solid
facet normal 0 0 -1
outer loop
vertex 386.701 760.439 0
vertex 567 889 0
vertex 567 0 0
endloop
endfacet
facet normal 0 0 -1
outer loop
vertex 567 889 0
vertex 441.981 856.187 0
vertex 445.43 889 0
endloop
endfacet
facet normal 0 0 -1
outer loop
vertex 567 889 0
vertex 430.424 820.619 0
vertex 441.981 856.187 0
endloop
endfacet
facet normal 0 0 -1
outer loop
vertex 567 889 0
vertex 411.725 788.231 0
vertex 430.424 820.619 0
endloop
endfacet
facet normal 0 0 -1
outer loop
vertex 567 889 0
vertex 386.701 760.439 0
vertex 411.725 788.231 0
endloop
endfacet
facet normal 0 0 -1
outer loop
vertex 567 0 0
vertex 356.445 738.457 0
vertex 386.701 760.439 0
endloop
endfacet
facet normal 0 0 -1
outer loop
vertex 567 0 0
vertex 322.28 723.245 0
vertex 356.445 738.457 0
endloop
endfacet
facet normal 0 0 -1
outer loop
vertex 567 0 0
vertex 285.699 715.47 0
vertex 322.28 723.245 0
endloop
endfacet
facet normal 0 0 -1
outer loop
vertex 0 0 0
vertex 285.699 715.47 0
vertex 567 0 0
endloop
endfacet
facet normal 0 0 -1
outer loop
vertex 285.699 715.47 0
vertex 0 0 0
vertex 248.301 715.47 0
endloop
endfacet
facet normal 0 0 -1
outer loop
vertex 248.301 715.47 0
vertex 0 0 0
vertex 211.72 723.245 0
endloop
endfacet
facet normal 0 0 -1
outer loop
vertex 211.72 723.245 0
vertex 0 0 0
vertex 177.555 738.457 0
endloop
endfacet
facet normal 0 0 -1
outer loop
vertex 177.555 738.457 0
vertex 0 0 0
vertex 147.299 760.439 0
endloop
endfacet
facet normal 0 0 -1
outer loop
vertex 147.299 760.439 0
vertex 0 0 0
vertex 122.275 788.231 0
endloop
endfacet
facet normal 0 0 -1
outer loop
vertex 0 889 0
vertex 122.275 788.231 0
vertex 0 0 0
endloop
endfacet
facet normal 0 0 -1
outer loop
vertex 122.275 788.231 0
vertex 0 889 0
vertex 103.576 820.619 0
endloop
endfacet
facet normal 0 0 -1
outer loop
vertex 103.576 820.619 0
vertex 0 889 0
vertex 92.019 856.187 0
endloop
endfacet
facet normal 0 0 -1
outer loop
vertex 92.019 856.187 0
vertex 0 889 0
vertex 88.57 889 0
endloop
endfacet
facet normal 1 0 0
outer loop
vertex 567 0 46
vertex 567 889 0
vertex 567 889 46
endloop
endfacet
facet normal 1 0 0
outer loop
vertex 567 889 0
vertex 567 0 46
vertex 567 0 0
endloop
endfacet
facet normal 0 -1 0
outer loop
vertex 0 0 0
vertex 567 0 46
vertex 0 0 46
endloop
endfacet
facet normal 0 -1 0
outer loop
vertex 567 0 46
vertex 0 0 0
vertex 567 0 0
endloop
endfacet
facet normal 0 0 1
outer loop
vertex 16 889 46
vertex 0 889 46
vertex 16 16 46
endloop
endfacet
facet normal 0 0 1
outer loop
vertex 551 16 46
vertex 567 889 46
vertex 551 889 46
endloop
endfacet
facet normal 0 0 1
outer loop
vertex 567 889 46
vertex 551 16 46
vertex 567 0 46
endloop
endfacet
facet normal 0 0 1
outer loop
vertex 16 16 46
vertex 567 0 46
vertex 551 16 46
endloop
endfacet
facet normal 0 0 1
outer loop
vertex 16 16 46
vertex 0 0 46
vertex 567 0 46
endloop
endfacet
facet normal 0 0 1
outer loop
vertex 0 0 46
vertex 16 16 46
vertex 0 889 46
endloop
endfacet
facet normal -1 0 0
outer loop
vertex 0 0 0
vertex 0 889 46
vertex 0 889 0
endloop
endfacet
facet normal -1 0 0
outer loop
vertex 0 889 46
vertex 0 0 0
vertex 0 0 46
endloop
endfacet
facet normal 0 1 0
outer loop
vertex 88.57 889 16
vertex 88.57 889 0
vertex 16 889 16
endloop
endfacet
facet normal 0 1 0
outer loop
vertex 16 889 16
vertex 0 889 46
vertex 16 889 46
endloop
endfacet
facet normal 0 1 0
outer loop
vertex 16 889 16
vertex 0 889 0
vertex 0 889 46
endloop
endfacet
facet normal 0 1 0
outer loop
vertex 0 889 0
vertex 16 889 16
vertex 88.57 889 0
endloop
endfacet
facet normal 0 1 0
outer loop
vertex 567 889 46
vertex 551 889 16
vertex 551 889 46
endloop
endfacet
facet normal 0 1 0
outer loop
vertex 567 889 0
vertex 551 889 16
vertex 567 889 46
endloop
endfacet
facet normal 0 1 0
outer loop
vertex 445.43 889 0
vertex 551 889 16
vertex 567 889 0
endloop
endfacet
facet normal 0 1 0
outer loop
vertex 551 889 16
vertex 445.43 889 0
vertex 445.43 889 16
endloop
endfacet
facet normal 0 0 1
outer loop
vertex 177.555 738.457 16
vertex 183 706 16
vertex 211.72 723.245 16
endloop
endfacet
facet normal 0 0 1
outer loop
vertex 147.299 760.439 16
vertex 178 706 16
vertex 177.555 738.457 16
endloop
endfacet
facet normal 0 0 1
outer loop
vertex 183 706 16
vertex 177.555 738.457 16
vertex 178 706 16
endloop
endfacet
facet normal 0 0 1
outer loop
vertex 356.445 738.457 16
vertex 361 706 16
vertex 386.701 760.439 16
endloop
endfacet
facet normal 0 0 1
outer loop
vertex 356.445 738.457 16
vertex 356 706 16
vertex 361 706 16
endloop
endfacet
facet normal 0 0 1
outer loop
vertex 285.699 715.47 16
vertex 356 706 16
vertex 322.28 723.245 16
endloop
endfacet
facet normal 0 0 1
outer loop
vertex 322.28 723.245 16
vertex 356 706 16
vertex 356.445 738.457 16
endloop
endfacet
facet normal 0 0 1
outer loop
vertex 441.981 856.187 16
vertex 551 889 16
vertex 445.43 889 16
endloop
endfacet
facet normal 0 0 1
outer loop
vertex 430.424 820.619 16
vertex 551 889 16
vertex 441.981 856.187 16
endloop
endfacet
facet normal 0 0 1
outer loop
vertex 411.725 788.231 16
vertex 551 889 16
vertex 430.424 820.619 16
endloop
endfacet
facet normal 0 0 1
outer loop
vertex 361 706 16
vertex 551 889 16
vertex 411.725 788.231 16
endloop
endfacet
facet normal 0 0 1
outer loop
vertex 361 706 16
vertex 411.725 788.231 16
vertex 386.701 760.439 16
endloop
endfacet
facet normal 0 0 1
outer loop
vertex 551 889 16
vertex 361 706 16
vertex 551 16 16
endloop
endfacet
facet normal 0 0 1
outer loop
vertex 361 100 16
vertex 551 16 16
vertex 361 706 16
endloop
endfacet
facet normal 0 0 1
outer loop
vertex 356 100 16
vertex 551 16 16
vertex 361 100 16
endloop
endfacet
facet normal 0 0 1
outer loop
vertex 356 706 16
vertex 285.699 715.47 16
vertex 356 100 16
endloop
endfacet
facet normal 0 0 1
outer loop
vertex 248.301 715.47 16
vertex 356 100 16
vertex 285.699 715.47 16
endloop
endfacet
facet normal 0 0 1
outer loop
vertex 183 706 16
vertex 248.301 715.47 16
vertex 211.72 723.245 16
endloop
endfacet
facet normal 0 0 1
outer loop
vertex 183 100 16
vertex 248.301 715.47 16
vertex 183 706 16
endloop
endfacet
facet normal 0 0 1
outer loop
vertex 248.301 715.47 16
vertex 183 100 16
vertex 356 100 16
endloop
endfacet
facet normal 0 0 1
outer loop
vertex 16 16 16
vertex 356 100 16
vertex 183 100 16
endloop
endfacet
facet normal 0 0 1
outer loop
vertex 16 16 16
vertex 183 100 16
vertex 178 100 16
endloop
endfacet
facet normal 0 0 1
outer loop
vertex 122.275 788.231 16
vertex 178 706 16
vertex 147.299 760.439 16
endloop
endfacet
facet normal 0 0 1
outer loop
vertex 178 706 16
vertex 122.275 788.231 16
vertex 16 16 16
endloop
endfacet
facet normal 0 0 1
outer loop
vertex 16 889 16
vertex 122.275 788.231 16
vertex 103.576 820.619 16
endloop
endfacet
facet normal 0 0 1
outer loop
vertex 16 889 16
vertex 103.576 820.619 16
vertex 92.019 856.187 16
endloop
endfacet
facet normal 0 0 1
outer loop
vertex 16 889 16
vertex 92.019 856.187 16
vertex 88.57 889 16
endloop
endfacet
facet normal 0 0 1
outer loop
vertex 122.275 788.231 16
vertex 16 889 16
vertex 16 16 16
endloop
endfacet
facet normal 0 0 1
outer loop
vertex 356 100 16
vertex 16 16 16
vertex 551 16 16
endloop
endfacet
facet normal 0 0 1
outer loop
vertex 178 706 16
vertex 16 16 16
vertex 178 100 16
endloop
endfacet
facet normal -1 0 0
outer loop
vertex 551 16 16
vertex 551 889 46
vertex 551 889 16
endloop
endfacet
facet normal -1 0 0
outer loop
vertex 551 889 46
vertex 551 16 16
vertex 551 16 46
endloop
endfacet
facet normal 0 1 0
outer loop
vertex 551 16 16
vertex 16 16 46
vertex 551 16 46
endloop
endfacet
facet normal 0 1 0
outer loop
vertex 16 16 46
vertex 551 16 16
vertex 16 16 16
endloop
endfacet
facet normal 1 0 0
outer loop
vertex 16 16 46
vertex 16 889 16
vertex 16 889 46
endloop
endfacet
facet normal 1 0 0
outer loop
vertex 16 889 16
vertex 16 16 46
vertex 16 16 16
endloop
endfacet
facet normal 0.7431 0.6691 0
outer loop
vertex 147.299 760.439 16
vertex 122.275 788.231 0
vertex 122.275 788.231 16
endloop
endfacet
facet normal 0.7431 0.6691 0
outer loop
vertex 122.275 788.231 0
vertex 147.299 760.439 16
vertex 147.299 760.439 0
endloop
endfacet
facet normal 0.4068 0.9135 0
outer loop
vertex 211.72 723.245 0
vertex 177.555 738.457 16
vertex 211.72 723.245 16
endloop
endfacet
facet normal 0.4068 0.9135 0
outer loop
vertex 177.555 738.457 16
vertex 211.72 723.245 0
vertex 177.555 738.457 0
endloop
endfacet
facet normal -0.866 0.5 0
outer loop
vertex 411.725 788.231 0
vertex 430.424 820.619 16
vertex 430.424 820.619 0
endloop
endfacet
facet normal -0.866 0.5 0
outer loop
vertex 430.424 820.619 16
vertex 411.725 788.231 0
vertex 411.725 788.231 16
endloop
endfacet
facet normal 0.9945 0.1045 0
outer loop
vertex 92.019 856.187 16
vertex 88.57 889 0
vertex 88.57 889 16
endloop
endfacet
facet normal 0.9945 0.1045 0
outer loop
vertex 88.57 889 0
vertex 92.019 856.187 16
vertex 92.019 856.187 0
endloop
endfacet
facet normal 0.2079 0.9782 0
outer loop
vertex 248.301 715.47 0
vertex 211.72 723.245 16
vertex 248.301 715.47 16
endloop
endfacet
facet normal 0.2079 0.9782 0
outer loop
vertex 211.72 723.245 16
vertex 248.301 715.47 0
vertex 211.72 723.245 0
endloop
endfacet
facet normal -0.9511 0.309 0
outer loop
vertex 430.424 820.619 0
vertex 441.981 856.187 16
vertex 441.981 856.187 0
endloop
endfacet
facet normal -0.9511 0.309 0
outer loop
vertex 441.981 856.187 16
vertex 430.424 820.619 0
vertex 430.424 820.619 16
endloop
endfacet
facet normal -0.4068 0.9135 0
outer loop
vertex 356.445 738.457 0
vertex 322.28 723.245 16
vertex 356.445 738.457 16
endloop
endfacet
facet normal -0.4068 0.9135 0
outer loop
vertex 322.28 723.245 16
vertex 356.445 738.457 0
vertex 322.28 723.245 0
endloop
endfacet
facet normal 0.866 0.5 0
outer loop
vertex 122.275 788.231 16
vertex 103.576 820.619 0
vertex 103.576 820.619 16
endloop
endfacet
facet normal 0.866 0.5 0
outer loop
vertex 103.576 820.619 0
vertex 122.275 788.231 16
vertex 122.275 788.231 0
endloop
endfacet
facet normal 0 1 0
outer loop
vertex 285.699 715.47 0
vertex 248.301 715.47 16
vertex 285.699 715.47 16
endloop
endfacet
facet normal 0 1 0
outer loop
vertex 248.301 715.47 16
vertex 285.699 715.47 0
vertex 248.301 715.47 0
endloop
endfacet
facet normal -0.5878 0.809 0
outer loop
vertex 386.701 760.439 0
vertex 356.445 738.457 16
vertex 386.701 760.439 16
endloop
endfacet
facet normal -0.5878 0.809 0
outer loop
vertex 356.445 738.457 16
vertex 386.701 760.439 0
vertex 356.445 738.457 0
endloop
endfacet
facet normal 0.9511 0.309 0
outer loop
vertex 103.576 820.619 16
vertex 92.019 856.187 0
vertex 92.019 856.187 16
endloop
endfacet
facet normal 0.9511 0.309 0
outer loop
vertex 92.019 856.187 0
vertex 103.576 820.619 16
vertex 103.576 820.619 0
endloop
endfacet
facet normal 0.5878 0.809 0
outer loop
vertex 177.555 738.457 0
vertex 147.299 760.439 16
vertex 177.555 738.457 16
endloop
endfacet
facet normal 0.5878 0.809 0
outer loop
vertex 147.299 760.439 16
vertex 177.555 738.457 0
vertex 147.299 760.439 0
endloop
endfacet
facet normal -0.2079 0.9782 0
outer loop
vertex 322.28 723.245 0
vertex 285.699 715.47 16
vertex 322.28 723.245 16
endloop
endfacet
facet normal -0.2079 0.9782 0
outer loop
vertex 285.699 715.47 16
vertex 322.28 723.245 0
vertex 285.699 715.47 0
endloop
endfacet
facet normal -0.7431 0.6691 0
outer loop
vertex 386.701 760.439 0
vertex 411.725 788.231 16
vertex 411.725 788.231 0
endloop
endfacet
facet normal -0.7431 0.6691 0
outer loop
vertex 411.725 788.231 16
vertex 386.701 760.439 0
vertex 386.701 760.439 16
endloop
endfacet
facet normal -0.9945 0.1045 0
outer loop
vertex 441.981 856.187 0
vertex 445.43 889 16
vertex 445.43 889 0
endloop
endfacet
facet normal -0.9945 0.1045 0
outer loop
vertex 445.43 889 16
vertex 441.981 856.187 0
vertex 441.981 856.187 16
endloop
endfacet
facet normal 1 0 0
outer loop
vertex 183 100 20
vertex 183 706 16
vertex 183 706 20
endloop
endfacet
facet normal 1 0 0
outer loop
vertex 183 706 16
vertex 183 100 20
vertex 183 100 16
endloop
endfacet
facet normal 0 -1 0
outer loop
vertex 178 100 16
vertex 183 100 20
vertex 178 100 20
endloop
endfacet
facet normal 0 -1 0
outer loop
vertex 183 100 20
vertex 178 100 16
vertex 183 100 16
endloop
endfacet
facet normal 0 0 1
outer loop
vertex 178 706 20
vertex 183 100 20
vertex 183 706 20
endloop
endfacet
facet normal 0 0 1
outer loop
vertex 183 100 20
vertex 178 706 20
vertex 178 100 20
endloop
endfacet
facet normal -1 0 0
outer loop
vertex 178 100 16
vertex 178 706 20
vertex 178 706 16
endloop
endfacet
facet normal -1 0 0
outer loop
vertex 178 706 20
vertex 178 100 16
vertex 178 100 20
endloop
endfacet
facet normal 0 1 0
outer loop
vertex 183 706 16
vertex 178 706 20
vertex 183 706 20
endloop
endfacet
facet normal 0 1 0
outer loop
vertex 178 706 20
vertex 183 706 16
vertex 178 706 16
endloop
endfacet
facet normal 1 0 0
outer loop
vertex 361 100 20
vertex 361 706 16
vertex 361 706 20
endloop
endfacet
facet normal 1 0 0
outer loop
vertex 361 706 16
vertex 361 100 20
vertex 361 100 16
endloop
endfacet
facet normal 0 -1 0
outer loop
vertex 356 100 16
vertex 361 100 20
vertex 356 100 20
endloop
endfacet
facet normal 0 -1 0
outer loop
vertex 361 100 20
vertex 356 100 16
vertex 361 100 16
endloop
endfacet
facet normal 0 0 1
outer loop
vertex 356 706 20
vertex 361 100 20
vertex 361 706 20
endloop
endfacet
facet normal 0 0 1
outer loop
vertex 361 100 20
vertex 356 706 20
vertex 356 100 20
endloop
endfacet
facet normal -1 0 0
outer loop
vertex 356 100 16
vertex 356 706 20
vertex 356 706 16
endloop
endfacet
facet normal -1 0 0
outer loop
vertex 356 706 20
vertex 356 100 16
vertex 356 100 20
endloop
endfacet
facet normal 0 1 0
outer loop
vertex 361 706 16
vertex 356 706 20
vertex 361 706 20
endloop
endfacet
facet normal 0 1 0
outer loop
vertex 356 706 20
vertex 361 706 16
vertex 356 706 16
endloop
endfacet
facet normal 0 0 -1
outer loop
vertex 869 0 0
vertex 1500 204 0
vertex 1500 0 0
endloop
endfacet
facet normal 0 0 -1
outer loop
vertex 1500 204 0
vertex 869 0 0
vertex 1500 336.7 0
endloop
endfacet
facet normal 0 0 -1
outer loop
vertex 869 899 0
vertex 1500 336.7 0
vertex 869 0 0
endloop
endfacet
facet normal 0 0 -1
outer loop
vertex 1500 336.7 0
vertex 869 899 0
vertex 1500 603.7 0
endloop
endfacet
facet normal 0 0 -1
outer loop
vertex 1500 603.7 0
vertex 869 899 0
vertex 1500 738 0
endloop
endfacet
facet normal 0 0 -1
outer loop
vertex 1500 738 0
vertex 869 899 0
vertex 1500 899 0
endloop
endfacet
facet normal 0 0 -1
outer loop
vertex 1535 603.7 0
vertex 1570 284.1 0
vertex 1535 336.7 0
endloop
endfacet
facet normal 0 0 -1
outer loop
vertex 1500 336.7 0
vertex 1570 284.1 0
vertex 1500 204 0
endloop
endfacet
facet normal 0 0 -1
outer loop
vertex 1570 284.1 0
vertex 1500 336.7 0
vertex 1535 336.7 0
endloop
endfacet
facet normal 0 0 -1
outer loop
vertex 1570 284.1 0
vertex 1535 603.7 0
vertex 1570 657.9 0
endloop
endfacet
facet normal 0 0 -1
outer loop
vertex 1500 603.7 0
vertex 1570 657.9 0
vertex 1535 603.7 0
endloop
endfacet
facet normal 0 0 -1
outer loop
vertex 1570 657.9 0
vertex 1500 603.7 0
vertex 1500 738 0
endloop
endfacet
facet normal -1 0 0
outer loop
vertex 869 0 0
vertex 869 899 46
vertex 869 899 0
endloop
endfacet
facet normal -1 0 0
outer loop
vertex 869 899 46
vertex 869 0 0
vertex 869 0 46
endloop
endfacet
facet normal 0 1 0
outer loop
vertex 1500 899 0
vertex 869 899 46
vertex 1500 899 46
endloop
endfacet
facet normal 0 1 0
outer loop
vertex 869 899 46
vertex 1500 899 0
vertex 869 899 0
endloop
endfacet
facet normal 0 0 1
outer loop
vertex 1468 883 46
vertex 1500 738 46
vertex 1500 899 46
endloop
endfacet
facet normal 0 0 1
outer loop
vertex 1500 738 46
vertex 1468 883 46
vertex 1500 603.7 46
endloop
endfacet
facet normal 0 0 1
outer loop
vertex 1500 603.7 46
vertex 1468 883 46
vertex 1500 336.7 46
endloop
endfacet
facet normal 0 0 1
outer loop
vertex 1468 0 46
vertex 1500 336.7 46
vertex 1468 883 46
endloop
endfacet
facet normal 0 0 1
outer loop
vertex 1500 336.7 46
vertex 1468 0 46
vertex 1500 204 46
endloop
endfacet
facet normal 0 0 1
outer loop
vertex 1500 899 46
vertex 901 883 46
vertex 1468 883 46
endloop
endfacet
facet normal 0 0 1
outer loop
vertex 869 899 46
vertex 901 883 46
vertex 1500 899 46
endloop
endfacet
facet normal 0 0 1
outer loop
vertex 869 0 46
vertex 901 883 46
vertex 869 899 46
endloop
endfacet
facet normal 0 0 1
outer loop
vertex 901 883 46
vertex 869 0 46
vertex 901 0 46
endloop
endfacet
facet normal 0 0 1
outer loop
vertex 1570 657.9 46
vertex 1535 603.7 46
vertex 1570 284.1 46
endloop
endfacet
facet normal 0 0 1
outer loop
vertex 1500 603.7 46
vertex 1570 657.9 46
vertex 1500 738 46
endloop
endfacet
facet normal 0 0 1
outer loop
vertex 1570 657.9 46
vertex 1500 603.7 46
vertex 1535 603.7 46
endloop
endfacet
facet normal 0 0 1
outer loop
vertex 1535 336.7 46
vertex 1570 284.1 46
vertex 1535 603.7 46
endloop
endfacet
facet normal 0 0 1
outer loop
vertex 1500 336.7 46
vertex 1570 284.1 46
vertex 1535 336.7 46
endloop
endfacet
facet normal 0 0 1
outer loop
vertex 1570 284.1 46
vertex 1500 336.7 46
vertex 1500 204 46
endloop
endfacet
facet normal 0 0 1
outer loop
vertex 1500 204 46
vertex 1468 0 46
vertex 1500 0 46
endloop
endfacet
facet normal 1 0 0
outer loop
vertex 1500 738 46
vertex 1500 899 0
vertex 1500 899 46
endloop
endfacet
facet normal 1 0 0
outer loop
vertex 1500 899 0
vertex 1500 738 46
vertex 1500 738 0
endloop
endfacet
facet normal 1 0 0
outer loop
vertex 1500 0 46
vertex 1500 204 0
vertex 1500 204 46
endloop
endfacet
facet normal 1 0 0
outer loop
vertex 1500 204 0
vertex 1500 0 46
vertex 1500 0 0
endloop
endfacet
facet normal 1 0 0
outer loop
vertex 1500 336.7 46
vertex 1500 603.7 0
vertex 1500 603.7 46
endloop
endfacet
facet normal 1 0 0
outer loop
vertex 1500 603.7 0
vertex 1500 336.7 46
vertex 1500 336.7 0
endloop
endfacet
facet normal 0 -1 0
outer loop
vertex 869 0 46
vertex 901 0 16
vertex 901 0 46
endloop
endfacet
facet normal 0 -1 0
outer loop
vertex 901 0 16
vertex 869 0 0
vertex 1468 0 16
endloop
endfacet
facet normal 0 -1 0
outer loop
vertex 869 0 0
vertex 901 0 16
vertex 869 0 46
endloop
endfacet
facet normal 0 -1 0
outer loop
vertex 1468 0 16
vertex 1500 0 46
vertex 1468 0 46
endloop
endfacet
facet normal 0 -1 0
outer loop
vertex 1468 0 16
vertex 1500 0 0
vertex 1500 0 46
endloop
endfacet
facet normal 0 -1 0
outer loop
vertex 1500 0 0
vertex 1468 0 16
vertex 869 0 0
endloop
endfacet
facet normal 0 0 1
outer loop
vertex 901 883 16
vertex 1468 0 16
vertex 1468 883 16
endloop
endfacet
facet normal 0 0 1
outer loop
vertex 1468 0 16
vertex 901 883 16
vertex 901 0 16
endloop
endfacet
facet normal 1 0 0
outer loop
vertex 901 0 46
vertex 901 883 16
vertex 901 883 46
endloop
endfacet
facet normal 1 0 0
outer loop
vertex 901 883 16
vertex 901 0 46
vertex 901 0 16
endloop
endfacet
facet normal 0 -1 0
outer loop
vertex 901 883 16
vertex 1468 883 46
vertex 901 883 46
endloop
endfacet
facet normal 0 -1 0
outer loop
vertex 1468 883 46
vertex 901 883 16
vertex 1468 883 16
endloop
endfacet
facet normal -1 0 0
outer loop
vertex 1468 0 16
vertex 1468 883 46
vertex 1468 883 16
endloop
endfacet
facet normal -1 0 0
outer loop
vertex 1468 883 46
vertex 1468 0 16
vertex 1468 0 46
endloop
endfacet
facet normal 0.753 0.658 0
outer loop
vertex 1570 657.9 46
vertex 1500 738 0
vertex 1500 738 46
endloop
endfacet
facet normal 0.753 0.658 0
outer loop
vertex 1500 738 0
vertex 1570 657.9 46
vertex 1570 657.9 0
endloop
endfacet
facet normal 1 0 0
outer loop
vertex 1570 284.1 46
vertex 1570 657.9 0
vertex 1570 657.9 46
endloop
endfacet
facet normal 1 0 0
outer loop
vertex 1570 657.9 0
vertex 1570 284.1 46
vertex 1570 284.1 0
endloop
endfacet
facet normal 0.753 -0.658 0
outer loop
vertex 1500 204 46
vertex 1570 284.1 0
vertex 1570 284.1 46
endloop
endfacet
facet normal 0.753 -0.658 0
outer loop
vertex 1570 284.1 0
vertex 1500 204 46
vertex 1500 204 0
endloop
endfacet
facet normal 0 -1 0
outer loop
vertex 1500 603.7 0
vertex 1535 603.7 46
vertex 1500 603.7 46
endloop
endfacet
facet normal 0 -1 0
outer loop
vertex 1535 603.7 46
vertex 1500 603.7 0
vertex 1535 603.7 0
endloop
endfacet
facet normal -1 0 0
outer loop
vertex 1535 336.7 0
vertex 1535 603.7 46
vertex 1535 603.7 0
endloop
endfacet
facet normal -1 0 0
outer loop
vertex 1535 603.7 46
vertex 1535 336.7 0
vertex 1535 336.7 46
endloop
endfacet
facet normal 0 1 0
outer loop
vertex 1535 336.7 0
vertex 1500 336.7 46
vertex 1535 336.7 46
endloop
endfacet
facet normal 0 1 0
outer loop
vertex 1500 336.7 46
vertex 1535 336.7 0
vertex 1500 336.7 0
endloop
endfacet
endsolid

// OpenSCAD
card_width = 534;
card_depth = 856;
card_height = 7;

card_play_v = 4;
card_play = 1;
enclosure_thickness = 8;

module cardEnclosureTop() {
    difference() {
        linear_extrude(height = (card_height + enclosure_thickness * 2) * 2) polygon(points = [
            [0, 0],
            [0, card_depth + card_play + 4 * enclosure_thickness + 10],
            [card_width + card_play + 12*enclosure_thickness, card_depth + card_play + 4* enclosure_thickness + 10],
            [card_width + card_play + 12*enclosure_thickness, 0]
        ]);
        translate([4*enclosure_thickness, 2*enclosure_thickness, 2*enclosure_thickness]) linear_extrude(height=100) polygon([
            [0, 0],
            [card_width + card_play + 4* enclosure_thickness, 0],
            [card_width + card_play + 4* enclosure_thickness, card_depth + card_play+100],
            [0, card_depth + card_play+100]
        ]);
    };
    translate([0, card_depth/2 - card_width/2]) {
        difference() {
        rotate([00, 0, 90]) linear_extrude(height= (card_height + enclosure_thickness * 2) * 2) polygon(points = [
            [0, 0],
            [0.15 * card_width, 70],
            [0.85 * card_width, 70],
            [card_width, 0]
        ]);
        translate([0, card_depth/2 - (1.1 * card_width)/2, -1]) linear_extrude(height=150) rotate([00, 0, 90]) polygon(points = [
            [0, 0],
            [card_width/2, 0],
            [card_width/2, 35],
            [0, 35]
        ]);
        };
    }
    
}

module cardEnclosureBottom() {
    difference() {
        linear_extrude(height = (card_height + enclosure_thickness * 2) * 2) polygon(points = [
            [0, 0],
            [0, card_depth + card_play + 4 * enclosure_thickness],
            [card_width + card_play + 4*enclosure_thickness, card_depth + card_play + 4* enclosure_thickness],
            [card_width + card_play + 4*enclosure_thickness, 0]
        ]);
        translate([2*enclosure_thickness, 2*enclosure_thickness, 2*enclosure_thickness]) linear_extrude(height=100) polygon([
            [0, 0],
            [card_width + card_play, 0],
            [card_width + card_play, card_depth + card_play + 100],
            [0, card_depth + card_play + 100]
        ]);
        translate([card_width/2, card_depth+card_width * 0.07, -1]) linear_extrude(height = 100) circle(d=card_width*0.67);
    };
    translate([card_width/3, 100]) linear_extrude(height = 2 * enclosure_thickness + 4) polygon([
        [0, 0],
        [5, 0],
        [5, card_depth-250],
        [0, card_depth-250]
    ]);
        translate([2 * card_width/3, 100]) linear_extrude(height = 2* enclosure_thickness + 4) polygon([
        [0, 0],
        [5, 0],
        [5, card_depth-250],
        [0, card_depth-250]
    ]);
}

module slidingHole(card_w, card_h) {
    translate([0, -card_w/3]) {
        translate([card_h/6-18, 0]) square(size = [card_h/3, card_h/3]);
        translate([card_w/2, 0]) circle(d=card_h/3);
        translate([card_w/2, card_h/3.2]) circle(d=card_h/3);
    };
}

cardEnclosureBottom();

translate([1500, 1 * card_depth + 4 * enclosure_thickness + card_play + 10]) rotate([180, 180, 0]) cardEnclosureTop();
